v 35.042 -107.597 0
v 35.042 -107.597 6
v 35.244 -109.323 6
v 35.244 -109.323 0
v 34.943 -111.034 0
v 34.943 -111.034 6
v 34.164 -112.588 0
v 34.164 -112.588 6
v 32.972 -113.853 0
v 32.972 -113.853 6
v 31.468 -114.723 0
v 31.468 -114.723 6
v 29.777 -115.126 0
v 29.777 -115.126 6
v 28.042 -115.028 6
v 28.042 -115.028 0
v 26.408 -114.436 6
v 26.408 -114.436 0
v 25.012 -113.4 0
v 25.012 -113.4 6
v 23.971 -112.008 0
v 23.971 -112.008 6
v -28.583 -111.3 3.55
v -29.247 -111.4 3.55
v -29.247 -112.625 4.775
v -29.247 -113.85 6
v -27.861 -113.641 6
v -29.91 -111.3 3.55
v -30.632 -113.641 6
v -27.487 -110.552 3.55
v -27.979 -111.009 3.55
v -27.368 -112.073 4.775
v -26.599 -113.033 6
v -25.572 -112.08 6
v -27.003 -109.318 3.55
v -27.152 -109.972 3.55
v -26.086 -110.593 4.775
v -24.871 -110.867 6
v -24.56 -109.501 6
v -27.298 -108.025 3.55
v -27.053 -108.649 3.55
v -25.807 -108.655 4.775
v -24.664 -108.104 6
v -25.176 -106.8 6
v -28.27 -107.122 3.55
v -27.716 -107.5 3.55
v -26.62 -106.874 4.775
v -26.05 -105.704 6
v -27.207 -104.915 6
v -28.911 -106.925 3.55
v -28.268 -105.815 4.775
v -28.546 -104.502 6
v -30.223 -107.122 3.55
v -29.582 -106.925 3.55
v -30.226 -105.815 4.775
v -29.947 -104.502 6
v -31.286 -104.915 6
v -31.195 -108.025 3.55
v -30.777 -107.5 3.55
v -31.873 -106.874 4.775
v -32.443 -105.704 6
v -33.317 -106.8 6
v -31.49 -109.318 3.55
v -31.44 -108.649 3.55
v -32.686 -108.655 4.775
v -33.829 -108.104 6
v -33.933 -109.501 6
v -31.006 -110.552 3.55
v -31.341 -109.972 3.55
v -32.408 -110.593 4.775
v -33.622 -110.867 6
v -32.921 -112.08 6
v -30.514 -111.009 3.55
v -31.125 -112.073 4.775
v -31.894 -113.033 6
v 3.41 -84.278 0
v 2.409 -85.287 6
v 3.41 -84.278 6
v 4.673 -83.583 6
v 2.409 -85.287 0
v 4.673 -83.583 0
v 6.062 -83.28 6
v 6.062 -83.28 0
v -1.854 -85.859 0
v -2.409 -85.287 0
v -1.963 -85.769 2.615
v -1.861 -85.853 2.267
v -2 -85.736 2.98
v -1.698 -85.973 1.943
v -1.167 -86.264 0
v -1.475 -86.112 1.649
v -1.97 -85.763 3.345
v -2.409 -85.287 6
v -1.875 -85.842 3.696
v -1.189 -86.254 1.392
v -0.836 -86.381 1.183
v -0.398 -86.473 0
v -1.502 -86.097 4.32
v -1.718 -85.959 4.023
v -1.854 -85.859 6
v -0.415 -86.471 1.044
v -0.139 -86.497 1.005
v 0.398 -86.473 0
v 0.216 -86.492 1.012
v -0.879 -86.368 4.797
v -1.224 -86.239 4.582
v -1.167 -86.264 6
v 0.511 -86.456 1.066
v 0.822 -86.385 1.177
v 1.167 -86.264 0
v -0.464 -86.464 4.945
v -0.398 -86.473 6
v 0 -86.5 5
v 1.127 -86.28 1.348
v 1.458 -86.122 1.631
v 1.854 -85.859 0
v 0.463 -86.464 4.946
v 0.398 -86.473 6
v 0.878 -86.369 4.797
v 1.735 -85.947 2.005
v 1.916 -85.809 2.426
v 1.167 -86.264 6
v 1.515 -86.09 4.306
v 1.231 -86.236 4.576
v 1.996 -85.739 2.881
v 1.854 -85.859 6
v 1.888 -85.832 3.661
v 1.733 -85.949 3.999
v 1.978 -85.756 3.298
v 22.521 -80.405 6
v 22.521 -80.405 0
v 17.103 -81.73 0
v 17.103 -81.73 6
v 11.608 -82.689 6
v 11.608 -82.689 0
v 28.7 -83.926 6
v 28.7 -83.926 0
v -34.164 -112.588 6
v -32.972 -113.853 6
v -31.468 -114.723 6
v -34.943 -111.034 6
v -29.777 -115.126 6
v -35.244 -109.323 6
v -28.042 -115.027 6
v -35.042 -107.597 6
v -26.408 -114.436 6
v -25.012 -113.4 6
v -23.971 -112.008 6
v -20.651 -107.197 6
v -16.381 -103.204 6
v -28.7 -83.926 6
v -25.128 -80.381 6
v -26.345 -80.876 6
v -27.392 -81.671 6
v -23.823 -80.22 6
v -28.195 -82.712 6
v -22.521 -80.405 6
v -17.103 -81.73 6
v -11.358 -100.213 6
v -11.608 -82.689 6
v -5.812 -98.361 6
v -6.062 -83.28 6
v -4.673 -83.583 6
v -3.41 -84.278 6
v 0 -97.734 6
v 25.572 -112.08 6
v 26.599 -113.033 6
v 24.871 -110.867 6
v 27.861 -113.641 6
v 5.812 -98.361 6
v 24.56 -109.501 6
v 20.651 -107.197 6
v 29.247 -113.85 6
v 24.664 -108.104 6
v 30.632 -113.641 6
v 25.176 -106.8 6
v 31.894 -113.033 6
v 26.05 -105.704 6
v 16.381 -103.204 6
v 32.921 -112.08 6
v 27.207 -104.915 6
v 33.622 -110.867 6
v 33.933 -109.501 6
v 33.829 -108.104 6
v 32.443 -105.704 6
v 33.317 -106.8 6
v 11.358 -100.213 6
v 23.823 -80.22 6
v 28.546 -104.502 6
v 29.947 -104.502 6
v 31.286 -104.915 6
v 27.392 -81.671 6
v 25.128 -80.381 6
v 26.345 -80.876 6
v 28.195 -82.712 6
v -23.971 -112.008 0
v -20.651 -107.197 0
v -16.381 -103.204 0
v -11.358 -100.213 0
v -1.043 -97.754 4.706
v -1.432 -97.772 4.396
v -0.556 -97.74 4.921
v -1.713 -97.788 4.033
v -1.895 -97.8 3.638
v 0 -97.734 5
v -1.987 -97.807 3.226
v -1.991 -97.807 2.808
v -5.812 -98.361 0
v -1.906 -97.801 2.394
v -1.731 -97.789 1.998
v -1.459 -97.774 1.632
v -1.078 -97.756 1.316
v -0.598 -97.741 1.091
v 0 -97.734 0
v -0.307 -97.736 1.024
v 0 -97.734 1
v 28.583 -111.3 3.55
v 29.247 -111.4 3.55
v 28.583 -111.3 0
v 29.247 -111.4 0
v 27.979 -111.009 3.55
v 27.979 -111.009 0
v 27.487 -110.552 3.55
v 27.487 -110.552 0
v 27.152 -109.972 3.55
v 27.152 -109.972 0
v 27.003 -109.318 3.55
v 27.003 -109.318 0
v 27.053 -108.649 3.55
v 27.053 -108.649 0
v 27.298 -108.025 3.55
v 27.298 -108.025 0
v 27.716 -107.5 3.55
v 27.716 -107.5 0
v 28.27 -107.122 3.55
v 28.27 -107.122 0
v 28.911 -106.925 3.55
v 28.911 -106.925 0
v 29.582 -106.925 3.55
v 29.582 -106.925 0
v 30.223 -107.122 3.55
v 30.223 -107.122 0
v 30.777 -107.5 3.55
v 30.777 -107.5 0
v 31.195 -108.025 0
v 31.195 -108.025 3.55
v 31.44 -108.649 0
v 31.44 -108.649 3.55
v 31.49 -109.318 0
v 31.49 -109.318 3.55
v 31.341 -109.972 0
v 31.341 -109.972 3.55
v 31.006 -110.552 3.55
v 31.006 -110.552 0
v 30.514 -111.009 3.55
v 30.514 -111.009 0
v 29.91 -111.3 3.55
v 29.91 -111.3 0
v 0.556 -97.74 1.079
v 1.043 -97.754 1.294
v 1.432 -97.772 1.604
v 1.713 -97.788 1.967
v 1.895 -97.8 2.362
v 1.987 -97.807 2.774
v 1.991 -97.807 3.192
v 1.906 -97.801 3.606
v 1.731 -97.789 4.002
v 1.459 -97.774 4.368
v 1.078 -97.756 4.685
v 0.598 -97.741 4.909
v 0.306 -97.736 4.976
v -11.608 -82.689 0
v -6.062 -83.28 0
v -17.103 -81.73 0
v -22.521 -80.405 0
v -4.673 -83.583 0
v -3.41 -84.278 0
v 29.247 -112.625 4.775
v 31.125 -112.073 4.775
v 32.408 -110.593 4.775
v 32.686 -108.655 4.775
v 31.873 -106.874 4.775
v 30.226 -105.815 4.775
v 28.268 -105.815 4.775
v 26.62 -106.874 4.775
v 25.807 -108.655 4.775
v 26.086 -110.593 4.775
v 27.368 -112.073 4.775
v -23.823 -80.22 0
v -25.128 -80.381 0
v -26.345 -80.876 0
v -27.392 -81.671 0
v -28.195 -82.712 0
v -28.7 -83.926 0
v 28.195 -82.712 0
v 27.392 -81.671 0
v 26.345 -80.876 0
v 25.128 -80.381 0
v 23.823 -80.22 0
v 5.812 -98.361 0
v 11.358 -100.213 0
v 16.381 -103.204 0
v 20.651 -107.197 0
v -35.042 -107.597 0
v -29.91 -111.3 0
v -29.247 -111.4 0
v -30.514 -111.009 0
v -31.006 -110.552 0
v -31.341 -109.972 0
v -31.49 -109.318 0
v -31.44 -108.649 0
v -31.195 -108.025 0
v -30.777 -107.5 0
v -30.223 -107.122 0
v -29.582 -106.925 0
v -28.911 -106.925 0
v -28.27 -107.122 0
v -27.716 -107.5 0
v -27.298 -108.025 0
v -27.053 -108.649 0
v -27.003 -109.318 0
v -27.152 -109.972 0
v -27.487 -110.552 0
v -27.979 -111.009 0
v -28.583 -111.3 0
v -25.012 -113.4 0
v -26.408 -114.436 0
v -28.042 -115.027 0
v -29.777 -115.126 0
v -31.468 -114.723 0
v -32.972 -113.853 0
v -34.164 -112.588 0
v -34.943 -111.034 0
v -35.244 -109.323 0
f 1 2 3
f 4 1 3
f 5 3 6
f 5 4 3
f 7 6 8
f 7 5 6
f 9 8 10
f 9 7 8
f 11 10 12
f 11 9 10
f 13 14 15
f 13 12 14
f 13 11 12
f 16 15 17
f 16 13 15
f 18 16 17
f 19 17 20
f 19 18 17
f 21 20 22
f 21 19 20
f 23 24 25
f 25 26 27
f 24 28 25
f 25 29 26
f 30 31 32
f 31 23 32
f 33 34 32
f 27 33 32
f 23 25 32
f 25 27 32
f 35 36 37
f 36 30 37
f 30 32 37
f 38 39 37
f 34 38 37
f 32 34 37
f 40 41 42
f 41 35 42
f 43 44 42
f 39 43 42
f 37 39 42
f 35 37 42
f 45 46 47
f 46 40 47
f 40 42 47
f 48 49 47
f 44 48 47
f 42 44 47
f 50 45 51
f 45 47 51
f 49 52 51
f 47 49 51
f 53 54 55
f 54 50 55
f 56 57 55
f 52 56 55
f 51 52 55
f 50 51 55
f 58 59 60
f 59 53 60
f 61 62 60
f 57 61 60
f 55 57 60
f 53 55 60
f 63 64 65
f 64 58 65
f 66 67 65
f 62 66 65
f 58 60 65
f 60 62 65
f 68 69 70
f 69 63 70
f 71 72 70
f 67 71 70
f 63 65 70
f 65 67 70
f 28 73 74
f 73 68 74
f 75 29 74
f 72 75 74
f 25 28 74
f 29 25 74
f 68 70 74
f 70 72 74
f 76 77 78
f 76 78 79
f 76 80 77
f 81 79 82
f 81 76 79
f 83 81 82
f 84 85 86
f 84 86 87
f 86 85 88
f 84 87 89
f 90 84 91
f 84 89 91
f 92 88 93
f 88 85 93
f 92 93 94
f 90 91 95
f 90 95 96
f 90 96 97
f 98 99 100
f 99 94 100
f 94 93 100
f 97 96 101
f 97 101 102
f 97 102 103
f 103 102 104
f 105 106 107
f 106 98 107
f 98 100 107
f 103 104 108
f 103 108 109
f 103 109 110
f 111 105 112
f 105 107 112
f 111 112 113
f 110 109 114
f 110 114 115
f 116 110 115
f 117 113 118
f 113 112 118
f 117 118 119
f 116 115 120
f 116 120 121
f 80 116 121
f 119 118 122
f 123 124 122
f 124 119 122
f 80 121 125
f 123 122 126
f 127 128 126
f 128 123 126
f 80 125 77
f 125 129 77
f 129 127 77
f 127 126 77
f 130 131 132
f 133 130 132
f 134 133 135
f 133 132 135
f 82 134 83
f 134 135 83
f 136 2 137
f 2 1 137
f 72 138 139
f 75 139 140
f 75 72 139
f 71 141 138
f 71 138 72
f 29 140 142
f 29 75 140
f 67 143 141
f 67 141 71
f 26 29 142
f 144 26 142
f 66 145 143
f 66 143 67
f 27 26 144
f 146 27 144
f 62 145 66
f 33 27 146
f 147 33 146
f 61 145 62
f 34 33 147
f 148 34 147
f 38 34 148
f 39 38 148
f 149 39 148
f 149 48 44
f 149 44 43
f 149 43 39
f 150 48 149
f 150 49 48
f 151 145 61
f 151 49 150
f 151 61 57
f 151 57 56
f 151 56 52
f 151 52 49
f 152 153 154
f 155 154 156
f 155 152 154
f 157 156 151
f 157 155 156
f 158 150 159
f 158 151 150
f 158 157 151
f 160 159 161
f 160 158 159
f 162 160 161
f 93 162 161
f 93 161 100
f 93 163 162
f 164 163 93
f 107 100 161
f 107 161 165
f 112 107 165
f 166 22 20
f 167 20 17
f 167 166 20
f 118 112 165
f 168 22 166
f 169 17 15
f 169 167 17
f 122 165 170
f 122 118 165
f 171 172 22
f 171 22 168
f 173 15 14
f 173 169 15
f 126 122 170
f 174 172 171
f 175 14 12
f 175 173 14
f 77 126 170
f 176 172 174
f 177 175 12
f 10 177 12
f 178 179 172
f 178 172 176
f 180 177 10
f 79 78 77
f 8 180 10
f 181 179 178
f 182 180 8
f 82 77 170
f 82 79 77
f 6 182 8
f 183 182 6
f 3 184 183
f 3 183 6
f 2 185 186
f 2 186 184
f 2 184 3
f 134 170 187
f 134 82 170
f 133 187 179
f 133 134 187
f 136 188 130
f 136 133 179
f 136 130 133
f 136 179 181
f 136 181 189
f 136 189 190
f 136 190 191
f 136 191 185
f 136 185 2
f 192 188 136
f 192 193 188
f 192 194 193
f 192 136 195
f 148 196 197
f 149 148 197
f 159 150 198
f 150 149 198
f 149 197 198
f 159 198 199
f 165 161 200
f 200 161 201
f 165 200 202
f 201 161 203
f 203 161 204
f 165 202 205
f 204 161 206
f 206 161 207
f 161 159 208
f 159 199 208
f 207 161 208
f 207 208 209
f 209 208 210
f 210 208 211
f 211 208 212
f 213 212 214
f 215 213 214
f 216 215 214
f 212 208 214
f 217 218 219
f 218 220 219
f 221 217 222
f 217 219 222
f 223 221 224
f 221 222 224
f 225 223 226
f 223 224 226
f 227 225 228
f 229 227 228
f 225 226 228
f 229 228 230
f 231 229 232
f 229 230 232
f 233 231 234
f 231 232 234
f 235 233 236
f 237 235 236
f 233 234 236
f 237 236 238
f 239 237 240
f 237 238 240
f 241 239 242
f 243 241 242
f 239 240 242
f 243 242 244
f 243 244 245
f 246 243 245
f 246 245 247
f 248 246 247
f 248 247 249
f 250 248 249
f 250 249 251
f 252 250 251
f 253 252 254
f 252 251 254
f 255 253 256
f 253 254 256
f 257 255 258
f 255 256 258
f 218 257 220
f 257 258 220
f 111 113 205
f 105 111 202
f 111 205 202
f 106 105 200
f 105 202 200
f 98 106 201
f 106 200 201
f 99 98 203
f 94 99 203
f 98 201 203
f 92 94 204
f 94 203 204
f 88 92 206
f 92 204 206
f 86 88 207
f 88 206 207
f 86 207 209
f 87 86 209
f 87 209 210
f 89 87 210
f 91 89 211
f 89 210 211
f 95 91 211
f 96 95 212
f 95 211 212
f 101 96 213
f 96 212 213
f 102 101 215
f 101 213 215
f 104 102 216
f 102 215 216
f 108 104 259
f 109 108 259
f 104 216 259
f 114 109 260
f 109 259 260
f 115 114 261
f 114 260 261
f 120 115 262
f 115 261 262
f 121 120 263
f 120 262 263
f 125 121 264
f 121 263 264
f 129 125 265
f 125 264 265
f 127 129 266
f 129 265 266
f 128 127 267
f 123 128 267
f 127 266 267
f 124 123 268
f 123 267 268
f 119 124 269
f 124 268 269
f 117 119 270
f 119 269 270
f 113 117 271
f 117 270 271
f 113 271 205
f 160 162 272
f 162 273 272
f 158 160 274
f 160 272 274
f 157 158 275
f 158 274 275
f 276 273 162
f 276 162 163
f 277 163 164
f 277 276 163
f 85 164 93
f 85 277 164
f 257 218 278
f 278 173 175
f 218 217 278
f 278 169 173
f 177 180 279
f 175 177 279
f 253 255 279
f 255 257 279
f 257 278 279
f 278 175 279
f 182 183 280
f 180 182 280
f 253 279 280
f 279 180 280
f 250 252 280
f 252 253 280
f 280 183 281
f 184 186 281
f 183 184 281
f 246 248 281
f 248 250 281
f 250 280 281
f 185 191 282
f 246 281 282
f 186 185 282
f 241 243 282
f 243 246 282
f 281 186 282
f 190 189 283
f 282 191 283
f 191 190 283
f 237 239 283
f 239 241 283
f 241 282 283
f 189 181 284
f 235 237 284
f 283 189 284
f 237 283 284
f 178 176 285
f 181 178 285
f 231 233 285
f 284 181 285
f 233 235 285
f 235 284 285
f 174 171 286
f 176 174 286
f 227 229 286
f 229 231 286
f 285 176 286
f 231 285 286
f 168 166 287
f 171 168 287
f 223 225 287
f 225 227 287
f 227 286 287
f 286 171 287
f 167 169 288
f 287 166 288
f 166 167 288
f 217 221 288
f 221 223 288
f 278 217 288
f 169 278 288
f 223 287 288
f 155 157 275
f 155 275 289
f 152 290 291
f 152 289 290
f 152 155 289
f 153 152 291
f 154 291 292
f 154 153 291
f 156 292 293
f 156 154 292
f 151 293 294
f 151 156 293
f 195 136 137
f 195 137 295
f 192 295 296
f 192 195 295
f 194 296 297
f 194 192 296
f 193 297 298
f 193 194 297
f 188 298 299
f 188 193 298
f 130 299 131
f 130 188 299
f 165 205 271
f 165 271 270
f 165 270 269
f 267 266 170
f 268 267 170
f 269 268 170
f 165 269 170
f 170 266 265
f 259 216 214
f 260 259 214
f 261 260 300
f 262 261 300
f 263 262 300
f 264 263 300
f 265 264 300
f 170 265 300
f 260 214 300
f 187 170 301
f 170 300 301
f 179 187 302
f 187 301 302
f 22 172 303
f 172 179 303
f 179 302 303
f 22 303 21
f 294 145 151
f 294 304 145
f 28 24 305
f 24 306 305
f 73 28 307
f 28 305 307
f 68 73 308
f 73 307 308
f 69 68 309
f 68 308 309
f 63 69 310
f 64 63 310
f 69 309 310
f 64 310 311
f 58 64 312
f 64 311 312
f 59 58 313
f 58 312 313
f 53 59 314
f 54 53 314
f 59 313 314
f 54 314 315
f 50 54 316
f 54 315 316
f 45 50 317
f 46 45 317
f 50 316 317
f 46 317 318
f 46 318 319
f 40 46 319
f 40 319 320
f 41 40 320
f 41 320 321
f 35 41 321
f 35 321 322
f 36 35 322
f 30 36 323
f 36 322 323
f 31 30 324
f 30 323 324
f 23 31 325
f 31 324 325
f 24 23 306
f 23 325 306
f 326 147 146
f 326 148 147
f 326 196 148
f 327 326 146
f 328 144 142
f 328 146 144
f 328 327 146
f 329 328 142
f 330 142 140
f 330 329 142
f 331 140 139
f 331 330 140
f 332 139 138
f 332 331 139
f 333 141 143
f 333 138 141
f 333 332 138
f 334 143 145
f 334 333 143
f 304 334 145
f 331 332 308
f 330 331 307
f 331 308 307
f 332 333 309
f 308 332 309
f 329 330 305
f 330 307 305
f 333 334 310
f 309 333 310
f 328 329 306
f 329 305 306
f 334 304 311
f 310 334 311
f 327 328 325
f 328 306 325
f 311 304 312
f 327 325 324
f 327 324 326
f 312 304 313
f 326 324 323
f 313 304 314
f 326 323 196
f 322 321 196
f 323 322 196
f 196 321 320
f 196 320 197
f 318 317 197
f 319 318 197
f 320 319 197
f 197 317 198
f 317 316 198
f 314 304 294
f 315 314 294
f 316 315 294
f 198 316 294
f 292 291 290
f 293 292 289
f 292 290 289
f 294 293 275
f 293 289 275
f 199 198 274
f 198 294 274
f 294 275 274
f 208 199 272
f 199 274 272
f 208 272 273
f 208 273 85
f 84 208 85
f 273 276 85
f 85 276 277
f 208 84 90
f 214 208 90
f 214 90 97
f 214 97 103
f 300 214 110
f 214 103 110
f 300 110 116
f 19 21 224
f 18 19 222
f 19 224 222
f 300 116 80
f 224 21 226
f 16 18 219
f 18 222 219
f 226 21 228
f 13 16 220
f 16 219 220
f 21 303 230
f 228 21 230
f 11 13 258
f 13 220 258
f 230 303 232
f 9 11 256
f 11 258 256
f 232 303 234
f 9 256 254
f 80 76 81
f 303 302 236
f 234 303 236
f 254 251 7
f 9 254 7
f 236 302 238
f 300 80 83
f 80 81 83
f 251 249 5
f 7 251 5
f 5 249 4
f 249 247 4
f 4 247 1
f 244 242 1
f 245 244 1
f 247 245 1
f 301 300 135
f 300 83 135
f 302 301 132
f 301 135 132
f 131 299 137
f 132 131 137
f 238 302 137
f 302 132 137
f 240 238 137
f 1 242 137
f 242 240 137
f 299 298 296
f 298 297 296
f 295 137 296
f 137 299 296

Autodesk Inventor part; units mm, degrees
ref_plane "YZ Plane" through (0, 0, 0) normal (1, 0, 0) x (0, 1, 0)
ref_plane "XY Plane" through (0, 0, 0) normal (0, 0, 1) x (1, 0, 0)
sketch "Sketch1" plane through (0, 0, 0) normal (0, 0, 1) x (1, 0, 0)
  arc A0 (-35.0421, -107.5967) -> (-23.9714, -112.0085) centre (-29.2466, -109.1496) ccw
  arc A1 (-27.3511, -78.8934) -> (27.3511, -78.8934) centre (0, 0) ccw
  line L0 (0, 0) -> (0, -147.6951) construction
  line L1 (0, 0) -> (-29.2466, -109.1496) construction
  line L2 (-35.0421, -107.5967) -> (-27.3511, -78.8934)
  arc A2 (0, -97.7345) -> (-23.9714, -112.0085) centre (0, -125) ccw
  arc A3 (23.9714, -112.0085) -> (35.0421, -107.5967) centre (29.2466, -109.1496) ccw
  line L3 (35.0421, -107.5967) -> (27.3511, -78.8934)
  arc A4 (23.9714, -112.0085) -> (0, -97.7345) centre (0, -125) ccw
  dimension "d0" = 167
  dimension "d1" = 12
  dimension "d2" = 15
  dimension "d3" = 113
  dimension "d4" = 125
extrude "Extrusion1" add sketch "Sketch1" along normal blind 6
sketch "Sketch2" plane through (0, 0, 6) normal (0, 0, 1) x (1, 0, 0)
  line L0 (-29.2466, -109.1496) -> (0, 0) construction
  line L1 (0, 0) -> (29.2466, -109.1496) construction
  line L2 (0, 0) -> (0, -137.2486) construction
  dimension "d14" = 15
  dimension "d15" = 15
  dimension "d16" = 113
  dimension "d17" = 113
hole "Hole1" at (-29.2466, -109.1496, 6) at (29.2466, -109.1496, 6) direction (0, 0, -1) diameter 4.5 end through all countersink diameter 9.4 countersink angle 90 clearance for "Countersunk Flat Head Screw DIN EN ISO 2009" size "M4" standard "DIN"
fillet "Fillet1" radius 5 2 edges at (-27.3511, -78.8934, 3) (27.3511, -78.8934, 3)
ref_plane "Work Plane1" through (-23.8699, -80.2202, 0) normal (0, 1, 0) x (-1, 0, 0)
sketch "Sketch3" plane through (-23.8699, -80.2202, 0) normal (0, 1, 0) x (-1, 0, 0)
  line L0 (11.1722, 0) -> (11.1722, 6) projected
  point P0 (-23.8699, 0)
  point P1 (-23.8699, 3)
  point P2 (11.1722, 3)
hole "Hole2" at (0, -80.2202, 3) direction (0, -1, 0) diameter 4 end through all
sketch "Sketch4" plane through (0, 0, 6) normal (0, 0, 1) x (1, 0, 0)
  arc A0 (-22.5214, -80.4055) -> (22.5214, -80.4055) centre (0, 0) ccw projected
  circle A1 centre (0, -83.5) radius 3
  point P0 (0, -83.5)
  point P1 (0, -83.5)
  dimension "d26" = 6
extrude "Extrusion2" cut sketch "Sketch4" against normal through all
fillet "Fillet2" radius 5 2 edges at (-2.9995, -83.4461, 3) (2.9995, -83.4461, 3)
equation "\"d15\" = d14"
equation "\"d17\" = d16"
properties part number "Gradient_positioner"
